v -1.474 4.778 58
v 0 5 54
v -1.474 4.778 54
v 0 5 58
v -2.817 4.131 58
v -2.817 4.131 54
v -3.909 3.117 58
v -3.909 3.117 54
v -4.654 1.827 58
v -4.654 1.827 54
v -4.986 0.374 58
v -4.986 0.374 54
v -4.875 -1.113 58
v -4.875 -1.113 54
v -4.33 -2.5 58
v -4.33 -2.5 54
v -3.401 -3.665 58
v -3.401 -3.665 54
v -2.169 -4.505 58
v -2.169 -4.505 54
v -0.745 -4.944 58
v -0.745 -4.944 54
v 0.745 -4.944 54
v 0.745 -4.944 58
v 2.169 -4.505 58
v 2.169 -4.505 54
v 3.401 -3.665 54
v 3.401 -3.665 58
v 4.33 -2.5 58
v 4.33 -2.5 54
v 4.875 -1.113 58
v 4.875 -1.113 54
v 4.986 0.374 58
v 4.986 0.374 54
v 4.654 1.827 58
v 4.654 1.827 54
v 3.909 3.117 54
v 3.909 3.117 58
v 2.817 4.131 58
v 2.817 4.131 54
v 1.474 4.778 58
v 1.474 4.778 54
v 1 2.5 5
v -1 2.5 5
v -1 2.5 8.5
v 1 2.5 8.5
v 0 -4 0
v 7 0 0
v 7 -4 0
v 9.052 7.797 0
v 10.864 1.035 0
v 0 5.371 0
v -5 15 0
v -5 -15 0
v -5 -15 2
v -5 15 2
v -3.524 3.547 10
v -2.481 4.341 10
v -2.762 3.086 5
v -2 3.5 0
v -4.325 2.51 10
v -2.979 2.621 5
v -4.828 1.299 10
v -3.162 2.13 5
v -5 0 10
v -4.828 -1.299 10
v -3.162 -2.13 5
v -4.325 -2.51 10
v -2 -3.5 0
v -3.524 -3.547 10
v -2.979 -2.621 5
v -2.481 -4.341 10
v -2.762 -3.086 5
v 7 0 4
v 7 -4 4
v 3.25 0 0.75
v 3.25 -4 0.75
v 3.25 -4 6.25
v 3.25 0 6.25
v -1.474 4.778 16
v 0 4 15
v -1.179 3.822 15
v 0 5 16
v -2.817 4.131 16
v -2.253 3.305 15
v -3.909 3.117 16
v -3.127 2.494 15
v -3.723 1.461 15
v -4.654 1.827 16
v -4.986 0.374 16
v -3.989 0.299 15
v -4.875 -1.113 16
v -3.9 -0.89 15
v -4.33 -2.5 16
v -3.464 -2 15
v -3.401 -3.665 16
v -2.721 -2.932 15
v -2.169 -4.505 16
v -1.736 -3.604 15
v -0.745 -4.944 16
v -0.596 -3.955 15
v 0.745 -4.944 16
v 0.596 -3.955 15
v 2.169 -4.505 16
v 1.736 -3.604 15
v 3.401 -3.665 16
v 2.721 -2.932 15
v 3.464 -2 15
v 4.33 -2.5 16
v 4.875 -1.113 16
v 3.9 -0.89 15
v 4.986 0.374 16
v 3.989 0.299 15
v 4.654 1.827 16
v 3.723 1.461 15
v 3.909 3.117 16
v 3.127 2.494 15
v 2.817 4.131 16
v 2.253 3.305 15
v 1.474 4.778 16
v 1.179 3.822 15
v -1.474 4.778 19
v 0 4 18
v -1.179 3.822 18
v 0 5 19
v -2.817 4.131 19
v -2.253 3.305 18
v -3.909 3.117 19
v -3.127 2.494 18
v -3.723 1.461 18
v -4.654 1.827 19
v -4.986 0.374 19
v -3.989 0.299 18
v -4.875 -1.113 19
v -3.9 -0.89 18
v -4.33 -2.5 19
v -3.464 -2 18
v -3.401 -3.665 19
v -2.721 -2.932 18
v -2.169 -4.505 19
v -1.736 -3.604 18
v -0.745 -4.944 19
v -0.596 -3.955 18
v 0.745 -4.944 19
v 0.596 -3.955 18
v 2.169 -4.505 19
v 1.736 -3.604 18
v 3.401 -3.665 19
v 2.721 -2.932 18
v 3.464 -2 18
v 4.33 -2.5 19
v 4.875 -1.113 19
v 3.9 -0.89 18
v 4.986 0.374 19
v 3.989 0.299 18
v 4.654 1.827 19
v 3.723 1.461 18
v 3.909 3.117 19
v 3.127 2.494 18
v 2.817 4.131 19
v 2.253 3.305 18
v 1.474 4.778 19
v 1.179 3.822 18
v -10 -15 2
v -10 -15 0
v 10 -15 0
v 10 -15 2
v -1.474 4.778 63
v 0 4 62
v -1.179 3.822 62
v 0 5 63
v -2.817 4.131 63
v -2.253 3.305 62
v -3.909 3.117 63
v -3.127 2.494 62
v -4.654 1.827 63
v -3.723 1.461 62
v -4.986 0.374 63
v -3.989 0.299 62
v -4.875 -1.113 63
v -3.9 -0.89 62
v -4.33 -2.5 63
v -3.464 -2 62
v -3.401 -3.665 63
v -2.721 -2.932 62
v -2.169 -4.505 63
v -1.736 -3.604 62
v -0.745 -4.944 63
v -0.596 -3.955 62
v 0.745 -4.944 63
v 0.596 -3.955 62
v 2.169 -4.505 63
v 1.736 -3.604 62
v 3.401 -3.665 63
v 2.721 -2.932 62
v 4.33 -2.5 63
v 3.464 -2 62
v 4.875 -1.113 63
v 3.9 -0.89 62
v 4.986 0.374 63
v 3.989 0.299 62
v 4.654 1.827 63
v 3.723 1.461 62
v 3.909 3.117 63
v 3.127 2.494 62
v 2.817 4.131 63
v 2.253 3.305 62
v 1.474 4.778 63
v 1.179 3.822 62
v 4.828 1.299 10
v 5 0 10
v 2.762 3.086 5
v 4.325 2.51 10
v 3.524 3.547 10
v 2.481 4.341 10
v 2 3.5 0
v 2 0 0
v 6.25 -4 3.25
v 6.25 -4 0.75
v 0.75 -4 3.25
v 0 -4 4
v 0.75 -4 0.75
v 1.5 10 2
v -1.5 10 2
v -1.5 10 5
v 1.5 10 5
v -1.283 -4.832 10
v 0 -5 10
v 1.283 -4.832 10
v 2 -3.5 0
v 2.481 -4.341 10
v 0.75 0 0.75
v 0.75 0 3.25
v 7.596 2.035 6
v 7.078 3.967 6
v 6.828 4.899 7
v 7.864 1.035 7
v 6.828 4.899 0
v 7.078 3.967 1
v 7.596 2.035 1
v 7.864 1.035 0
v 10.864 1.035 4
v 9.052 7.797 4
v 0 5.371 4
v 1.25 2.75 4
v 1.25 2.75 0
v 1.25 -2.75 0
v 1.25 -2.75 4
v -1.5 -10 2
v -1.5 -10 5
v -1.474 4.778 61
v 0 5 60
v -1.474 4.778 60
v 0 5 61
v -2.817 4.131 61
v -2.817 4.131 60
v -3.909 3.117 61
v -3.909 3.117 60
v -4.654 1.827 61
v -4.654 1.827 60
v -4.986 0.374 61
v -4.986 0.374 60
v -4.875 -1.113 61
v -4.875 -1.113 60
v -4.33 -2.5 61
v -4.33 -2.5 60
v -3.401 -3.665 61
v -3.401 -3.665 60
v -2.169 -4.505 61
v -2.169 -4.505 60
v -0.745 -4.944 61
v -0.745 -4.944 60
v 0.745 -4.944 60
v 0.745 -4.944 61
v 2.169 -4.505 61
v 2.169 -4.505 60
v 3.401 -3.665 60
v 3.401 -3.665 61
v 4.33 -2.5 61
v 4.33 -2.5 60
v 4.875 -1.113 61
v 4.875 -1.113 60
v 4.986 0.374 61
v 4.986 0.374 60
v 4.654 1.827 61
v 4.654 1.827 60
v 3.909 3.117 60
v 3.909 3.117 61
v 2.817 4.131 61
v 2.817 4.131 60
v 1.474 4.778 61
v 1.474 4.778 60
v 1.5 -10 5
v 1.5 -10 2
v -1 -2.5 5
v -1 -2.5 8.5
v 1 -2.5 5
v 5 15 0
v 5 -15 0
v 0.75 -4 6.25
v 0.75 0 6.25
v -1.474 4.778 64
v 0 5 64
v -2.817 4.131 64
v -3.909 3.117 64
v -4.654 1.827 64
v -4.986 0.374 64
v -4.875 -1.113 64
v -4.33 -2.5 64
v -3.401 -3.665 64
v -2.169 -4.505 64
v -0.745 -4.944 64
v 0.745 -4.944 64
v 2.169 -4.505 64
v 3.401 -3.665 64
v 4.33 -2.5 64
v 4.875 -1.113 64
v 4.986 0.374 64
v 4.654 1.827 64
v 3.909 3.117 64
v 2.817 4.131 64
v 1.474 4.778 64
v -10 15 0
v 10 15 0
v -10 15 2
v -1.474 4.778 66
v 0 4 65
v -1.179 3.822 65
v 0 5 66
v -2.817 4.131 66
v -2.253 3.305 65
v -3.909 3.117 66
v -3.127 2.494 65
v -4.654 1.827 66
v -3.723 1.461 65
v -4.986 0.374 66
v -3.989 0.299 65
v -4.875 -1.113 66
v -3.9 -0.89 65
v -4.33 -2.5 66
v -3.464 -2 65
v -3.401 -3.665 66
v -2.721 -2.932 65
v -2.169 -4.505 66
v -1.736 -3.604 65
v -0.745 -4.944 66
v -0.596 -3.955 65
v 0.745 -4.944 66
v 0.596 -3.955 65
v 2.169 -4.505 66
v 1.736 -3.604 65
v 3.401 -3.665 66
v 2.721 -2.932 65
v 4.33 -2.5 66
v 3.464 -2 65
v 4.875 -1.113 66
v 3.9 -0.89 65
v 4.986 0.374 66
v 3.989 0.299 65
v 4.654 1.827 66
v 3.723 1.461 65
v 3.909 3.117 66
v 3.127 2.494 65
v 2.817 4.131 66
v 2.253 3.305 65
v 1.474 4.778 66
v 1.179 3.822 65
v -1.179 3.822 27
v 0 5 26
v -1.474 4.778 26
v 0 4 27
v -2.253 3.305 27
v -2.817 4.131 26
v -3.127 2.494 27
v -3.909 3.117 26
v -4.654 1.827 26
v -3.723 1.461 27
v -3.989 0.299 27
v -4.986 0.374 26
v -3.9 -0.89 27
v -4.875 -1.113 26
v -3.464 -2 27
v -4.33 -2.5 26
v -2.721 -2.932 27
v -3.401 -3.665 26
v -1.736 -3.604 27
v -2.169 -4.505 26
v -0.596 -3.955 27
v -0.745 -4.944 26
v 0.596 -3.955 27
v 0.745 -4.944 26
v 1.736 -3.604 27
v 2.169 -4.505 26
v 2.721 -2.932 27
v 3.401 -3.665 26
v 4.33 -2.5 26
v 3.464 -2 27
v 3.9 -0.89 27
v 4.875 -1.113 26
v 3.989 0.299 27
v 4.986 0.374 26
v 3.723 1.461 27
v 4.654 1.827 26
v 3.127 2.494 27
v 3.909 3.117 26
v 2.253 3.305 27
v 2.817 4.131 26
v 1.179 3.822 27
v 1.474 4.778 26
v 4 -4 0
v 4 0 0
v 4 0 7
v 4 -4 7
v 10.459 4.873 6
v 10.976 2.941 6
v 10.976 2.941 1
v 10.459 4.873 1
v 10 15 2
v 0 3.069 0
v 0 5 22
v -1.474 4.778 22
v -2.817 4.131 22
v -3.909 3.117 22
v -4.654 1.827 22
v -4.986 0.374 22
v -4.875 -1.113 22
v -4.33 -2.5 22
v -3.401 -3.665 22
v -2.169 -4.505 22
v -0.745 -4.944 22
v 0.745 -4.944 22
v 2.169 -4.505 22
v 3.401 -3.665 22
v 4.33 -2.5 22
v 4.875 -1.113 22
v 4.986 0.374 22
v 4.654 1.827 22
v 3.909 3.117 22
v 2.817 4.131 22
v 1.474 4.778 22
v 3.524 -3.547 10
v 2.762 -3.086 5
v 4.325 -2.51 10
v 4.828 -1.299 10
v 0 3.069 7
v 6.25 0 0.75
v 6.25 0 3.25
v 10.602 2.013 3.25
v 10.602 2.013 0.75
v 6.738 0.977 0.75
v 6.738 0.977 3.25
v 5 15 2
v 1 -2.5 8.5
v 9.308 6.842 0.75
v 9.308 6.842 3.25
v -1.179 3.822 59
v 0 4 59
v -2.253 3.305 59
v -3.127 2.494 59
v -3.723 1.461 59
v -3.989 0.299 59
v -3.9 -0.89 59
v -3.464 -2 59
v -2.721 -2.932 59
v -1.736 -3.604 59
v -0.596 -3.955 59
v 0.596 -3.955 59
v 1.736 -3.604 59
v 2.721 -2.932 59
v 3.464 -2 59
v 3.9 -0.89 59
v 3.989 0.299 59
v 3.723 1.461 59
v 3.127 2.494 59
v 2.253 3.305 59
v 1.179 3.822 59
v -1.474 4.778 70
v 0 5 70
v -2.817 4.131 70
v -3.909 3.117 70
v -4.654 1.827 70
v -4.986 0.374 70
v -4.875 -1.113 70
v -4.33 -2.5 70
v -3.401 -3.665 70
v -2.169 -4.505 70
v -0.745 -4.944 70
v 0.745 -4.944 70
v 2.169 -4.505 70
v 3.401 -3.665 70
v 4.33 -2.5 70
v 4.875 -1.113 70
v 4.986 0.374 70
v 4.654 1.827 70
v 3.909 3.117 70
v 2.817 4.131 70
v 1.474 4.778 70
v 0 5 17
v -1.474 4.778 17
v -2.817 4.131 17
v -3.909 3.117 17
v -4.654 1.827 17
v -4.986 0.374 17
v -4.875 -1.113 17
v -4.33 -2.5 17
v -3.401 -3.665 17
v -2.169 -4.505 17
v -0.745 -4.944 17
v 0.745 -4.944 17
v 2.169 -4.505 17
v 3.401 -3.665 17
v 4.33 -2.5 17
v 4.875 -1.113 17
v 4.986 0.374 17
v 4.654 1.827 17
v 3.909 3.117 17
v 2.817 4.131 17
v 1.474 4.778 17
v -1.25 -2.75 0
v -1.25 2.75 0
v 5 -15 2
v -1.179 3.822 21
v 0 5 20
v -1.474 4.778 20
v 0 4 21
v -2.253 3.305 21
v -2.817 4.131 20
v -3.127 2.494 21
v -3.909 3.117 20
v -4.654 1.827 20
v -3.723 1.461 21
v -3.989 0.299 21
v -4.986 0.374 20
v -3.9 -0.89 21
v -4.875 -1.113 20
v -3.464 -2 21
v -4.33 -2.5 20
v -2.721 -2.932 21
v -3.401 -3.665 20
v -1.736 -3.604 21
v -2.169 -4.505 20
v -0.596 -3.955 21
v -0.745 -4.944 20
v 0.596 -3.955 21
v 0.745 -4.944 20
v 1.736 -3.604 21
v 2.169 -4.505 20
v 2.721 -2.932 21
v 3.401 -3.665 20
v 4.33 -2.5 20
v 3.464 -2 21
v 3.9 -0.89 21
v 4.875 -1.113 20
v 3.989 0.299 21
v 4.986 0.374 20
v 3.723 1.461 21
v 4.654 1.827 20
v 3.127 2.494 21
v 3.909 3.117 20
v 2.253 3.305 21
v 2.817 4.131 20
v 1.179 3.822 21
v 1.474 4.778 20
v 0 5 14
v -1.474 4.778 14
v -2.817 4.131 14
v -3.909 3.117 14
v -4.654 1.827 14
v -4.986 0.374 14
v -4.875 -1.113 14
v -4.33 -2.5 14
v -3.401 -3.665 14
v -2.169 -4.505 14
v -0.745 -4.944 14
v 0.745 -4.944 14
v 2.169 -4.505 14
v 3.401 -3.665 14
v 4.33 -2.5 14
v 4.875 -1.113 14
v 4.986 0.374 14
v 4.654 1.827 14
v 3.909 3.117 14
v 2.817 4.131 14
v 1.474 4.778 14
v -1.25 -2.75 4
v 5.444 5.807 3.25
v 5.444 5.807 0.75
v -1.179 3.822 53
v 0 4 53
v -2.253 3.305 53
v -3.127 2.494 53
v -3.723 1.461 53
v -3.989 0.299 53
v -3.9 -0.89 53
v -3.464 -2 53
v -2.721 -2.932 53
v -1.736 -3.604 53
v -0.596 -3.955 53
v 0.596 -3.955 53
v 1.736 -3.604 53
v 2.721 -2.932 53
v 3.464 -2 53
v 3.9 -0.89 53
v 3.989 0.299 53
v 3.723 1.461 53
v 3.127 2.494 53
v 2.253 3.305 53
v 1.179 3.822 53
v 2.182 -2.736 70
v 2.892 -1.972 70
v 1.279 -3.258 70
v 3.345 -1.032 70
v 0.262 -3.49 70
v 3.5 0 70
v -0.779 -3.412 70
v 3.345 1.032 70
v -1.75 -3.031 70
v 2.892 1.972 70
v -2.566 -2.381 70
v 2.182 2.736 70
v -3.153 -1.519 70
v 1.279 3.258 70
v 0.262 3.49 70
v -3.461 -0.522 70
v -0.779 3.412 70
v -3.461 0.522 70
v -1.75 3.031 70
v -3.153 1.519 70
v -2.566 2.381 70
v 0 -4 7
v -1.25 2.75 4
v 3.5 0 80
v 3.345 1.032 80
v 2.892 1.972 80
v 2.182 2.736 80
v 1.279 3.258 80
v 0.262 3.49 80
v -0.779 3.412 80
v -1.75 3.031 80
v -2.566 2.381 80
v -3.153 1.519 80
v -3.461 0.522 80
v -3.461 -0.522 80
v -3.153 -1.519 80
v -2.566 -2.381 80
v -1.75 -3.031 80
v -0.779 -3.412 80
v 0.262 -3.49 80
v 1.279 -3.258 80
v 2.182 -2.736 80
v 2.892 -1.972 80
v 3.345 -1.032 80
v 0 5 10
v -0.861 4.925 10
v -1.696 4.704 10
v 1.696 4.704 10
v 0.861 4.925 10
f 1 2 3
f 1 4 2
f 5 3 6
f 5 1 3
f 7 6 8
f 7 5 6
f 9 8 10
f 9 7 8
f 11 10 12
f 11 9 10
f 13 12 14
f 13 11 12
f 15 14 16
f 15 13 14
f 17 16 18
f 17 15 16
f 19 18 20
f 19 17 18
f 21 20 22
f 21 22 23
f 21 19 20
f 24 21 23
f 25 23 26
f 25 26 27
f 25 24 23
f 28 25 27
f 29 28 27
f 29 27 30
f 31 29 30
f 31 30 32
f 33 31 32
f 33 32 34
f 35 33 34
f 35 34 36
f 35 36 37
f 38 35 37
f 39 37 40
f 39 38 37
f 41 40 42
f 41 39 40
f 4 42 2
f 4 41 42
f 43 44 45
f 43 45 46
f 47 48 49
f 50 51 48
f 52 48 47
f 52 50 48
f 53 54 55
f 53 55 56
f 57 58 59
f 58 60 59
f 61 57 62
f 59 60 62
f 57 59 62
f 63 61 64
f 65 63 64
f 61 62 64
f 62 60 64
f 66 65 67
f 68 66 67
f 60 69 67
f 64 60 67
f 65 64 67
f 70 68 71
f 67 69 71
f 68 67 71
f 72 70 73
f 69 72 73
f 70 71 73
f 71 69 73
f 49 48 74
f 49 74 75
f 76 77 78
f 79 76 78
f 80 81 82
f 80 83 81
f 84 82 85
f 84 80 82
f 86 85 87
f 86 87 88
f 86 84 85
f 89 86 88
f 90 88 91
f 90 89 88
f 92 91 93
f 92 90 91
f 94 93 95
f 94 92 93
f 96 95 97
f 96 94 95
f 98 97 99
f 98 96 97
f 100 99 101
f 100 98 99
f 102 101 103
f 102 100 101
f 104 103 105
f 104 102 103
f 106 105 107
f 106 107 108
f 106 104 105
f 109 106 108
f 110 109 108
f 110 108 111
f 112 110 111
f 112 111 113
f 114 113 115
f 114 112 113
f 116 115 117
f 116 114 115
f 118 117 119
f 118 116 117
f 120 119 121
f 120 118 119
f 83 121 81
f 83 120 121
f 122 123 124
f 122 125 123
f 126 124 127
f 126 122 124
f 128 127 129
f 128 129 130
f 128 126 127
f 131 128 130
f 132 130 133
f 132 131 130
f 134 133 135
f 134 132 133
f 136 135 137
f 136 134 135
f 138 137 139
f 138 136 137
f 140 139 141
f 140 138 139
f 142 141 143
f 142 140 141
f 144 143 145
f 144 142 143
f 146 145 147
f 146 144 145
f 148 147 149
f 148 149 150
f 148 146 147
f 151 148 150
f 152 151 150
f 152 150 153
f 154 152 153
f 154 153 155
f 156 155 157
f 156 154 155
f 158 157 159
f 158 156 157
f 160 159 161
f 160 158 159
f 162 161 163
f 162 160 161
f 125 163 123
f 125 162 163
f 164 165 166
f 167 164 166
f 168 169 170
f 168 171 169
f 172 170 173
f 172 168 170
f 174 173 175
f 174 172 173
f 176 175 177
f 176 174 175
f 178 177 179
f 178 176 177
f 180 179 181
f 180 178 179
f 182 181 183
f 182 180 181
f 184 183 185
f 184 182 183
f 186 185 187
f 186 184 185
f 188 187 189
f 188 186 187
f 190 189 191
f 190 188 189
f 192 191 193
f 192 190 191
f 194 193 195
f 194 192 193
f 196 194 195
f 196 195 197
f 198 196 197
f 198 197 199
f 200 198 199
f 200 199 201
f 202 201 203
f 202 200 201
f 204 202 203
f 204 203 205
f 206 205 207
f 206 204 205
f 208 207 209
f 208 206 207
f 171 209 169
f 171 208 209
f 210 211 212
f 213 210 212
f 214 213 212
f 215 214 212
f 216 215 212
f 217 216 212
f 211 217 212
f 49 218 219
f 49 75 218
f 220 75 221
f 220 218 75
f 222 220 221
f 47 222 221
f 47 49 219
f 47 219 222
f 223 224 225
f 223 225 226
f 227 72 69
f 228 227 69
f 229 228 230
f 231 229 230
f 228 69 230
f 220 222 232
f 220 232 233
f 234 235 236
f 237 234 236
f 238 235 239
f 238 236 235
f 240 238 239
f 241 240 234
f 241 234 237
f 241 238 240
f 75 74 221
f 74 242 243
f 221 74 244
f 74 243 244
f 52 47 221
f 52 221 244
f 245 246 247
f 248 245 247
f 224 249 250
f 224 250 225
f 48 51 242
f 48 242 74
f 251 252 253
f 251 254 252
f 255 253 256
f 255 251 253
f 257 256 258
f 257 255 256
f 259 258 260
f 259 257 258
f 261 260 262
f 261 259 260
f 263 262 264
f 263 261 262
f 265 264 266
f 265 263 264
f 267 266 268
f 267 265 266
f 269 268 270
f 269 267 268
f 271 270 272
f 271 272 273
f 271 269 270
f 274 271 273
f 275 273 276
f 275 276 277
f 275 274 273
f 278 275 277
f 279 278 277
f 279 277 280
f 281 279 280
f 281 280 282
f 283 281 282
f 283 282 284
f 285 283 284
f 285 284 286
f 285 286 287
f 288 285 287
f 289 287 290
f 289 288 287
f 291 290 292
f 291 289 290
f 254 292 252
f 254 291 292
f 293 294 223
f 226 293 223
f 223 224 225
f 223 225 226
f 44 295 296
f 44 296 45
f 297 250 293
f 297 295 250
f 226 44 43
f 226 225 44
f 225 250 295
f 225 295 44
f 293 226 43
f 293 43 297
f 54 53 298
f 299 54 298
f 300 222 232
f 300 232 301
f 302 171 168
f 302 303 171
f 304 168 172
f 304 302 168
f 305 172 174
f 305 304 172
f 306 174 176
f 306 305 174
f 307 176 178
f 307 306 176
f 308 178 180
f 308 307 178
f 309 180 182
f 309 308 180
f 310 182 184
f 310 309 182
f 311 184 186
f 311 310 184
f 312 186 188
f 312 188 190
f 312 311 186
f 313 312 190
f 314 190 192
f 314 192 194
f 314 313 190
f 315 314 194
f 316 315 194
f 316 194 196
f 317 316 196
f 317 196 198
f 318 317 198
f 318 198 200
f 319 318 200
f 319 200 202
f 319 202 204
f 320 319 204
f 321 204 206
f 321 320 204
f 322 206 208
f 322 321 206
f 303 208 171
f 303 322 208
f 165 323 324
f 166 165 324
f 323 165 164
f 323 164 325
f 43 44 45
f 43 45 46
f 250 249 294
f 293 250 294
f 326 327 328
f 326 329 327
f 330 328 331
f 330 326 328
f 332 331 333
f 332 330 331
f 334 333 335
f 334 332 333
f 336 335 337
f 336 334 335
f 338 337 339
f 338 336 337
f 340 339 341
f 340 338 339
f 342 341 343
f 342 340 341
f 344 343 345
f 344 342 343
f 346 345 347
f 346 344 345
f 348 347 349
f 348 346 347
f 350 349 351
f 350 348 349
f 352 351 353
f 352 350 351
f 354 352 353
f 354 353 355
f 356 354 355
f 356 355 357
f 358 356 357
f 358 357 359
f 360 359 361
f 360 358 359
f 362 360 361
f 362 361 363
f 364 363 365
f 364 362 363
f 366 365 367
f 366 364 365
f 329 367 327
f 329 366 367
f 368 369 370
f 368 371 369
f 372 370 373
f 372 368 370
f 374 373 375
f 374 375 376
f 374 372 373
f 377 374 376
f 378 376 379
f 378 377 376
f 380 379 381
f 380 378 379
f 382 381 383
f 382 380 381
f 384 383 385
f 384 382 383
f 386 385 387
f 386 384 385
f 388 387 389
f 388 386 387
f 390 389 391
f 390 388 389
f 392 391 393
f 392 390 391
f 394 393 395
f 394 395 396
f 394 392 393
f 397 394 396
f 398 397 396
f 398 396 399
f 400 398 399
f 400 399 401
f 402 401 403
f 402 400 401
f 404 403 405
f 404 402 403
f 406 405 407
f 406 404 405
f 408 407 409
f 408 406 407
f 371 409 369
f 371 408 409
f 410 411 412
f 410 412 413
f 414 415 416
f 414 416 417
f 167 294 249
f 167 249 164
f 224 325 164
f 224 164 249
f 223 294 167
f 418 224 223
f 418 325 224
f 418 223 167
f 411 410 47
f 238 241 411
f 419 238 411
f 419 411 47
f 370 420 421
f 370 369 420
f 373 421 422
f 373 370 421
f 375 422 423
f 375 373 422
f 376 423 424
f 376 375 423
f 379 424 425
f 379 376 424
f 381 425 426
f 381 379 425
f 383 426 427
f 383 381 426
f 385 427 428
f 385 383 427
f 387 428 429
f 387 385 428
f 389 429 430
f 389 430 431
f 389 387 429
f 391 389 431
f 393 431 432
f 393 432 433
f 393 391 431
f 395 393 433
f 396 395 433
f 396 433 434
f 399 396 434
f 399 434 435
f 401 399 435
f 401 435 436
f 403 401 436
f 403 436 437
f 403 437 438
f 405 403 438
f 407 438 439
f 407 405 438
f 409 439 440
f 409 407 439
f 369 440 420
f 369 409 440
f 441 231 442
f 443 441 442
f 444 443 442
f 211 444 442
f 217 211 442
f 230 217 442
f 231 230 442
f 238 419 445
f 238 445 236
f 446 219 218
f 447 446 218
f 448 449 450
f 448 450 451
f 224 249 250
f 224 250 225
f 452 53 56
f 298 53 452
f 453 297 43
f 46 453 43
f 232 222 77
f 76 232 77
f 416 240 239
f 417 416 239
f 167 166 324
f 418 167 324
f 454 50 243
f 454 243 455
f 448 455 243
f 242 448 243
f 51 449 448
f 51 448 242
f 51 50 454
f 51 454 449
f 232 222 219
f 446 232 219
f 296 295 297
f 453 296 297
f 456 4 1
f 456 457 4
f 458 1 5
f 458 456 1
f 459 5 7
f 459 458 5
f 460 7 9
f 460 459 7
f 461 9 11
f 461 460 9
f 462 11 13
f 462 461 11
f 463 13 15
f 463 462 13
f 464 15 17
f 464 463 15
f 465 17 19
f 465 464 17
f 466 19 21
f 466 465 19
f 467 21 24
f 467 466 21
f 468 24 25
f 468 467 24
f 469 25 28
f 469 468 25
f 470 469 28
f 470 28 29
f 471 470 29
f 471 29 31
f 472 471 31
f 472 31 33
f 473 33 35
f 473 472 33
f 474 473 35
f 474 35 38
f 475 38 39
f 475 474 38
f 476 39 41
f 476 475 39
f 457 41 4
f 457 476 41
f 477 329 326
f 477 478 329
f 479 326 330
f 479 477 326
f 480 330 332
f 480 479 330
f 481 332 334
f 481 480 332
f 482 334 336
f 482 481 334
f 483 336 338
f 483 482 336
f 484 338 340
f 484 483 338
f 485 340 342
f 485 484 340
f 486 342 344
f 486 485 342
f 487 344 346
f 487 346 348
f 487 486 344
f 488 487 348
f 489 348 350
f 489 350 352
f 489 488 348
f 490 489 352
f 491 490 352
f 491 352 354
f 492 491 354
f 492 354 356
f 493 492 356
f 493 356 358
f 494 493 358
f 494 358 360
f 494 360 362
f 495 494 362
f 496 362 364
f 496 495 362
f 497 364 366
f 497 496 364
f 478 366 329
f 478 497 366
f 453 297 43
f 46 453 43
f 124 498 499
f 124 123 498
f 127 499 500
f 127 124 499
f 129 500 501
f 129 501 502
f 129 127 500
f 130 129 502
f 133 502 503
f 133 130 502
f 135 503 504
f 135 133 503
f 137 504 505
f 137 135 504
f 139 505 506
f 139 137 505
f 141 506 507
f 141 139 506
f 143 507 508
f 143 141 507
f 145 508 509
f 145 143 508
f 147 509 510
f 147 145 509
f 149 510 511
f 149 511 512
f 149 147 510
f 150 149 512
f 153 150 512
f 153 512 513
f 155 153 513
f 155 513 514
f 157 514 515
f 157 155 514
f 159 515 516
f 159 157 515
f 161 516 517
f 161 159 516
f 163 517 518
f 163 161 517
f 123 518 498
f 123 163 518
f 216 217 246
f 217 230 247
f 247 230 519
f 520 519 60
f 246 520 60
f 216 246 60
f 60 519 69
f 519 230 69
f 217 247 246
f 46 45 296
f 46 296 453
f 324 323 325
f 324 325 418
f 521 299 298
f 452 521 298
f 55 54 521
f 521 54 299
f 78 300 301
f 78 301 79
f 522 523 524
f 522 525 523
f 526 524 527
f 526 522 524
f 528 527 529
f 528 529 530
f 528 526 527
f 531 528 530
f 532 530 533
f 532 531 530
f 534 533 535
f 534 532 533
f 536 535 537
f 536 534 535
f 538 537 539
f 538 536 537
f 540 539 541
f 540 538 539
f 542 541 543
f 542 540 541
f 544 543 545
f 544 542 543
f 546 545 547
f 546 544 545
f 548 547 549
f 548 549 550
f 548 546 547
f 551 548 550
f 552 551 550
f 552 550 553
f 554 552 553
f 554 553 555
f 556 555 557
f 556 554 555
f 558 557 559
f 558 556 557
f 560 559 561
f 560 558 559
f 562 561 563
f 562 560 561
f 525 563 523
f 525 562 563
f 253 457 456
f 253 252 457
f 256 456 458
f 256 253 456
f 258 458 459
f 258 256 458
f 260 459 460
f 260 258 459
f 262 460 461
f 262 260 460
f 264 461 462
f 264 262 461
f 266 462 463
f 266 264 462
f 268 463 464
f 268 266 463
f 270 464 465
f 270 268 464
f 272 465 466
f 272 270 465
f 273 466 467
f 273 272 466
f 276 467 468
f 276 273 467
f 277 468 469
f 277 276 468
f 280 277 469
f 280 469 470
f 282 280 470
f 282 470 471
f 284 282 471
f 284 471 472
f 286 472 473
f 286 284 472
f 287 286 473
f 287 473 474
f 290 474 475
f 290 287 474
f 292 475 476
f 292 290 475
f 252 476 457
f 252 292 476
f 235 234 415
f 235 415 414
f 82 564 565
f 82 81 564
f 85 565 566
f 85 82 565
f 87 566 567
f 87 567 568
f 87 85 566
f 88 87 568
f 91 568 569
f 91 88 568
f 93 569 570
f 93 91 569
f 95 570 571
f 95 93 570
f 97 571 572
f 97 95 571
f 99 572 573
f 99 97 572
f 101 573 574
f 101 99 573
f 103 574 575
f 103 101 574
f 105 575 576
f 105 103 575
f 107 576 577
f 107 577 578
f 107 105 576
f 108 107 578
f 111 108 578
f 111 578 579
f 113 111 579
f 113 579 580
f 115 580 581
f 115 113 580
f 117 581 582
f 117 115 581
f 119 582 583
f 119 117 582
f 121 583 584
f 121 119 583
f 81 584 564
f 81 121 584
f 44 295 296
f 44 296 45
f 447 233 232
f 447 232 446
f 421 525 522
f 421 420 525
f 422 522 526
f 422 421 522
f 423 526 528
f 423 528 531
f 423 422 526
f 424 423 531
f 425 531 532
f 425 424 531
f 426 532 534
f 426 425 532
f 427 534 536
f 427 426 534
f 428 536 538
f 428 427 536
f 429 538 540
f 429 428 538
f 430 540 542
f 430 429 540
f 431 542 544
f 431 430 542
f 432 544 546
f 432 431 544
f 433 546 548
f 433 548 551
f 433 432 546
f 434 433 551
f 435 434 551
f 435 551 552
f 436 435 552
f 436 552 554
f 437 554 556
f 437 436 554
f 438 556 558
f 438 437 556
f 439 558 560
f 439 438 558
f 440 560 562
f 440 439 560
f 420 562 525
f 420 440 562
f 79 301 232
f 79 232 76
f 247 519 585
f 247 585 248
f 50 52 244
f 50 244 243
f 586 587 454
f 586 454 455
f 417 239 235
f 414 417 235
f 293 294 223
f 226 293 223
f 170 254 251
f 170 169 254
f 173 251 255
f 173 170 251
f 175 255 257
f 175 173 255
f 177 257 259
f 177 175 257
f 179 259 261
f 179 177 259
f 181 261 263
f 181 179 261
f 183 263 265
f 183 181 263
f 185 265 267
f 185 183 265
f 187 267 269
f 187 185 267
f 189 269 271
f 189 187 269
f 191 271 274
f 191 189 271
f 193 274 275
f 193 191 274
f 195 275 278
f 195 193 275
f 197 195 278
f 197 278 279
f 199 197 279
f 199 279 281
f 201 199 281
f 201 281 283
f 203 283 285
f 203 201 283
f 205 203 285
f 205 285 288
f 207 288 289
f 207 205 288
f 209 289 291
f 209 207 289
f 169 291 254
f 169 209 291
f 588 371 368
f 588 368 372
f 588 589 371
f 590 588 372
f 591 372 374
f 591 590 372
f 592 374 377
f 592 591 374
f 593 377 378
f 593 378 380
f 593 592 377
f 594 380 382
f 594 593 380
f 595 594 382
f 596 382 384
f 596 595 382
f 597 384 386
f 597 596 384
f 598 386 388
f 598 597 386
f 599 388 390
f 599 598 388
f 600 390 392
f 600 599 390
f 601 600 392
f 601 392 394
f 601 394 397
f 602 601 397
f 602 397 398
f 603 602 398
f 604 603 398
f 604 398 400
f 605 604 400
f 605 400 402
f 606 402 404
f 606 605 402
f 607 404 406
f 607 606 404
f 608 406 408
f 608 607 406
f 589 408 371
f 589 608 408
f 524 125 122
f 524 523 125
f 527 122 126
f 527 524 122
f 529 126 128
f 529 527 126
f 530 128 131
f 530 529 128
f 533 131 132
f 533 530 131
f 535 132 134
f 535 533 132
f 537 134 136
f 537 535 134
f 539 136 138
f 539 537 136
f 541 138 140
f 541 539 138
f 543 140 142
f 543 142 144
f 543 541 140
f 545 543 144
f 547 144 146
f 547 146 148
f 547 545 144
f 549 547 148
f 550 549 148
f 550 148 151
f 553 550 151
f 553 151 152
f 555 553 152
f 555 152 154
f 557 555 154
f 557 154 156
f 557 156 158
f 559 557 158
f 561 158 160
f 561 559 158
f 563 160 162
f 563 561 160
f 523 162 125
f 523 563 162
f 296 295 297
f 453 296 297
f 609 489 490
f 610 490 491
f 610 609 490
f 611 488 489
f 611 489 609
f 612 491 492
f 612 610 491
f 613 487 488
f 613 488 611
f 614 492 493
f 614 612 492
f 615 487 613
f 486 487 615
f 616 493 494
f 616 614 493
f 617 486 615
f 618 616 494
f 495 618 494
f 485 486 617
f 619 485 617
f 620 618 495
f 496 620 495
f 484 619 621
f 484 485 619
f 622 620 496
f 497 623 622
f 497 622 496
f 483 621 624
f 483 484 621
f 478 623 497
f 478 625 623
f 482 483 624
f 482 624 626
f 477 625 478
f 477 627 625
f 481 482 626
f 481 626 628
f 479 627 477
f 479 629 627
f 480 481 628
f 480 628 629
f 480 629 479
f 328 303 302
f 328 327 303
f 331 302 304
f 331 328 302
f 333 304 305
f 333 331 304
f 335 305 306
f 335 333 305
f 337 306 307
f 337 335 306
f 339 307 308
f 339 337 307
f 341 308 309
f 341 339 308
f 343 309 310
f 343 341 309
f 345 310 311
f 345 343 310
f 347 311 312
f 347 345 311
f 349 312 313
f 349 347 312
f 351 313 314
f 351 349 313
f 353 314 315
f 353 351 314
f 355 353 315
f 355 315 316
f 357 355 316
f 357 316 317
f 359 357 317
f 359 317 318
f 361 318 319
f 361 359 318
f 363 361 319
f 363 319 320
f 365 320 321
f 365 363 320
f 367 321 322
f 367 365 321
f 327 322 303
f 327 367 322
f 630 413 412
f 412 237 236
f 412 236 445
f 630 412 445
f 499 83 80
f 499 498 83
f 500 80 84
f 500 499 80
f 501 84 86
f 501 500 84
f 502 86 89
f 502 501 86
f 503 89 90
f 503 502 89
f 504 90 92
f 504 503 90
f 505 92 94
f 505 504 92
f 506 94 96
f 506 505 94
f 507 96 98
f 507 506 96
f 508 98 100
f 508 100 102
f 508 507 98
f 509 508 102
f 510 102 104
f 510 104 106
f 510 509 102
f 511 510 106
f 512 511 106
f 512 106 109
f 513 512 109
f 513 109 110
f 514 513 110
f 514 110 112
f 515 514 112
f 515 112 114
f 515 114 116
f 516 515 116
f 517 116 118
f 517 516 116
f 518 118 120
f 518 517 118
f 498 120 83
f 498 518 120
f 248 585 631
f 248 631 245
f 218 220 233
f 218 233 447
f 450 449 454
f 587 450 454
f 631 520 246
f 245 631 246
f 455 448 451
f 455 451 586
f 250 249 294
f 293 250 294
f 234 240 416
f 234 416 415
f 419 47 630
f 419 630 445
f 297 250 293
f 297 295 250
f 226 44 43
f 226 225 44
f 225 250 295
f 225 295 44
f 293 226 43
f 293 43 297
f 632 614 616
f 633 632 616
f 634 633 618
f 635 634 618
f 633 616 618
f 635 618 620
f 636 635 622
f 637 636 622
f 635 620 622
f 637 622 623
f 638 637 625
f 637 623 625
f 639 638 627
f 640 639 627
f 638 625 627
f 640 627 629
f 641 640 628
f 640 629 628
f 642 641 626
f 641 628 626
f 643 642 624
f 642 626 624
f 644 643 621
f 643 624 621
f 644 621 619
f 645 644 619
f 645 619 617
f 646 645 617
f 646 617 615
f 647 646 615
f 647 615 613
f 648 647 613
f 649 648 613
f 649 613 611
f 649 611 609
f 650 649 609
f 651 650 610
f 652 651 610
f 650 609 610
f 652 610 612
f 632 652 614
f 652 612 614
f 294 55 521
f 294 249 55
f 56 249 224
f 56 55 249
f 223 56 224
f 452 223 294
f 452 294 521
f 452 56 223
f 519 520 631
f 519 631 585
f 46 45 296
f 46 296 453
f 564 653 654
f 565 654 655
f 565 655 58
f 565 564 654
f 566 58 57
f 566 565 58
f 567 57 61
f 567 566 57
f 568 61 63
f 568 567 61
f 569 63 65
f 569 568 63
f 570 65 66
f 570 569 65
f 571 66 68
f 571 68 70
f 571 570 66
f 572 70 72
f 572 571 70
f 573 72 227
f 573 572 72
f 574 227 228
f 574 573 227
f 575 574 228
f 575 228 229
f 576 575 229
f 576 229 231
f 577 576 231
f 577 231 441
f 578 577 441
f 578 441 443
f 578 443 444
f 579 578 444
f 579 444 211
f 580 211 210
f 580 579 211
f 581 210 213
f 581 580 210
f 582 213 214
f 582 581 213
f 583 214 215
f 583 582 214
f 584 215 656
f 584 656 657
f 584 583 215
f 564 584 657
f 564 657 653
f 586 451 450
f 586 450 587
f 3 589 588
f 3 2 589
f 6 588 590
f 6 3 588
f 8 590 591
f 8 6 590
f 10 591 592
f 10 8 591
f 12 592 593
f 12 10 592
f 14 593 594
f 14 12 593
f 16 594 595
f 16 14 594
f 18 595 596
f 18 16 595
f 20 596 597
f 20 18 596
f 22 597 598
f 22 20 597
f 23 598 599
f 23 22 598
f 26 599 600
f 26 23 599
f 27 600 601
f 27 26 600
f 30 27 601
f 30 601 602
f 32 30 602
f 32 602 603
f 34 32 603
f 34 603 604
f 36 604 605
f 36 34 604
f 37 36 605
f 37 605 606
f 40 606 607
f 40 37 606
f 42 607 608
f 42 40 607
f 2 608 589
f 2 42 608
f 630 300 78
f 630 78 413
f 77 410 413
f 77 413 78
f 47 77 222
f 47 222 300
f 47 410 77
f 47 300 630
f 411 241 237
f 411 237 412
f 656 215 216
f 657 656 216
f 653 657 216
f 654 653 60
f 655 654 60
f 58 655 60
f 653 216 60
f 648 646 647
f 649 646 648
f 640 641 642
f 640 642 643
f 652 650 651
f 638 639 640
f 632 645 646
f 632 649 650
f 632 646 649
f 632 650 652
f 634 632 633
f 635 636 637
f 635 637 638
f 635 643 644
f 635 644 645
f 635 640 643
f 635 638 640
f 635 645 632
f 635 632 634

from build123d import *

# Parameters (mm, degrees)
SKETCH_W        = 20
SKETCH_H        = 30
PAD_DEPTH       = 2
SKETCH001_W     = 3
SKETCH001_H     = 20
PAD001_DEPTH    = 3
SKETCH002_W     = 2
SKETCH002_H     = 5
PAD002_DEPTH    = 3.5
PAD003_DEPTH    = 4
SKETCH004_W     = 5.5
SKETCH004_H     = 2.5
POCKET_DEPTH    = 4
SKETCH005_W     = 5
SKETCH005_H     = 2.5
POCKET001_DEPTH = 4
PAD004_DEPTH    = 7
SKETCH007_W     = 2.5
SKETCH007_H     = 5.5
POCKET002_DEPTH = 4
SKETCH008_W     = 2
SKETCH008_H     = 5
PAD006_DEPTH    = 3.5
SKETCH010_R     = 5
SKETCH009_W     = 4
SKETCH009_H     = 7
SKETCH013_R     = 3.5
PAD005_DEPTH    = 10
SKETCH014_W     = 2.5
SKETCH014_H     = 5.5
POCKET003_DEPTH = 4
SKETCH015_W     = 10
SKETCH015_H     = 30
PAD007_DEPTH    = 2
SKETCH016_W     = 3
SKETCH016_H     = 20
PAD008_DEPTH    = 3
SKETCH017_W     = 2
SKETCH017_H     = 5
PAD009_DEPTH    = 3.5


with BuildPart() as connectorback:
    # Sketch → Pad (new body)
    with BuildSketch(Plane.XY):
        Rectangle(SKETCH_W, SKETCH_H)
    extrude(amount=PAD_DEPTH)

    # Sketch001 (on Face6 of Pad) → Pad001 (join)
    with BuildSketch(Plane.XY.offset(2)):
        Rectangle(SKETCH001_W, SKETCH001_H)
    extrude(amount=PAD001_DEPTH)

    # Sketch002 (on Face11 of Pad001) → Pad002 (join)
    with BuildSketch(Plane.XY.offset(5)):
        Rectangle(SKETCH002_W, SKETCH002_H)
    extrude(amount=PAD002_DEPTH)


with BuildPart() as rotatorhorizont:
    # Sketch003 → Pad003 (new body)
    with BuildSketch(Plane.XY):
        Polygon((7, 0), (7, -4), (0, -4), (0, 5.371289), (9.05197, 7.796757), (10.863703, 1.035276), align=None)
    extrude(amount=PAD003_DEPTH)

    # Sketch004 (on Face2 of Pad003) → Pocket (cut)
    with BuildSketch(Plane.XZ.offset(4)):
        with Locations((3.5, 2)):
            Rectangle(SKETCH004_W, SKETCH004_H)
    extrude(amount=-POCKET_DEPTH, mode=Mode.SUBTRACT)

    # Sketch005 (on Face6 of Pocket) → Pocket001 (cut)
    with BuildSketch(Plane(origin=(10.394792, 2.785276, 0), x_dir=(-0.258819, 0.965926, 0), z_dir=(0.965926, 0.258819, 0))):
        with Locations((1.7, 2)):
            Rectangle(SKETCH005_W, SKETCH005_H)
    extrude(amount=-POCKET001_DEPTH, mode=Mode.SUBTRACT)


with BuildPart() as rotatorvertical:
    # Sketch006 → Pad004 (new body)
    with BuildSketch(Plane.XY):
        Polygon((4, 0), (4, -4), (0, -4), (0, 3.069308), (6.828427, 4.898979), (7.863703, 1.035276), align=None)
    extrude(amount=PAD004_DEPTH)

    # Sketch007 (on Face2 of Pad004) → Pocket002 (cut)
    with BuildSketch(Plane.XZ.offset(4)):
        with Locations((2, 3.5)):
            Rectangle(SKETCH007_W, SKETCH007_H)
    extrude(amount=-POCKET002_DEPTH, mode=Mode.SUBTRACT)

    # Sketch008 (on Face6 of Pocket002) → Pad006 (join)
    with BuildSketch(Plane(origin=(7.595754, 2.035276, 0), x_dir=(-0.258819, 0.965926, 0), z_dir=(0.965926, 0.258819, 0))):
        with Locations((1, 3.5)):
            Rectangle(SKETCH008_W, SKETCH008_H)
    extrude(amount=PAD006_DEPTH)


with BuildPart() as pillar:
    # Sketch010 → AdditiveLoft section 0
    with BuildSketch(Plane.XY.offset(10)):
        Circle(SKETCH010_R)
    # Sketch009 → AdditiveLoft section 1
    with BuildSketch(Plane.XY):
        Rectangle(SKETCH009_W, SKETCH009_H)
    loft()

    # Sketch012 → Revolution (revolve)
    with BuildSketch(Plane(origin=(0, 0, 10), x_dir=(0, 1, 0), z_dir=(1, 0, 0))):
        Polygon((0, 0), (5, 0), (5, 4), (4, 5), (5, 6), (5, 7), (4, 8), (5, 9), (5, 10), (4, 11), (5, 12), (5, 16), (4, 17), (4, 43), (5, 44), (5, 48), (4, 49), (5, 50), (5, 51), (4, 52), (5, 53), (5, 54), (4, 55), (5, 56), (5, 60), (0, 60), align=None)
    revolve(axis=Axis((0, 0, 10), (0, 0, 1)))

    # Sketch013 (on Face30 of Revolution) → Pad005 (new body)
    with BuildSketch(Plane.XY.offset(70)):
        Circle(SKETCH013_R)
    extrude(amount=PAD005_DEPTH)

    # Sketch014 (on Face4 of Pad005) → Pocket003 (cut)
    with BuildSketch(Plane(origin=(0, 0, 0), x_dir=(1, 0, 0), z_dir=(0, 0, -1))):
        Rectangle(SKETCH014_W, SKETCH014_H)
    extrude(amount=-POCKET003_DEPTH, mode=Mode.SUBTRACT)


with BuildPart() as connectorfront:
    # Sketch015 → Pad007 (new body)
    with BuildSketch(Plane.XY):
        Rectangle(SKETCH015_W, SKETCH015_H)
    extrude(amount=PAD007_DEPTH)

    # Sketch016 (on Face6 of Pad007) → Pad008 (join)
    with BuildSketch(Plane.XY.offset(2)):
        Rectangle(SKETCH016_W, SKETCH016_H)
    extrude(amount=PAD008_DEPTH)

    # Sketch017 (on Face11 of Pad008) → Pad009 (join)
    with BuildSketch(Plane.XY.offset(5)):
        Rectangle(SKETCH017_W, SKETCH017_H)
    extrude(amount=PAD009_DEPTH)


solid = Compound([connectorback.part, rotatorhorizont.part, rotatorvertical.part, pillar.part, connectorfront.part])
